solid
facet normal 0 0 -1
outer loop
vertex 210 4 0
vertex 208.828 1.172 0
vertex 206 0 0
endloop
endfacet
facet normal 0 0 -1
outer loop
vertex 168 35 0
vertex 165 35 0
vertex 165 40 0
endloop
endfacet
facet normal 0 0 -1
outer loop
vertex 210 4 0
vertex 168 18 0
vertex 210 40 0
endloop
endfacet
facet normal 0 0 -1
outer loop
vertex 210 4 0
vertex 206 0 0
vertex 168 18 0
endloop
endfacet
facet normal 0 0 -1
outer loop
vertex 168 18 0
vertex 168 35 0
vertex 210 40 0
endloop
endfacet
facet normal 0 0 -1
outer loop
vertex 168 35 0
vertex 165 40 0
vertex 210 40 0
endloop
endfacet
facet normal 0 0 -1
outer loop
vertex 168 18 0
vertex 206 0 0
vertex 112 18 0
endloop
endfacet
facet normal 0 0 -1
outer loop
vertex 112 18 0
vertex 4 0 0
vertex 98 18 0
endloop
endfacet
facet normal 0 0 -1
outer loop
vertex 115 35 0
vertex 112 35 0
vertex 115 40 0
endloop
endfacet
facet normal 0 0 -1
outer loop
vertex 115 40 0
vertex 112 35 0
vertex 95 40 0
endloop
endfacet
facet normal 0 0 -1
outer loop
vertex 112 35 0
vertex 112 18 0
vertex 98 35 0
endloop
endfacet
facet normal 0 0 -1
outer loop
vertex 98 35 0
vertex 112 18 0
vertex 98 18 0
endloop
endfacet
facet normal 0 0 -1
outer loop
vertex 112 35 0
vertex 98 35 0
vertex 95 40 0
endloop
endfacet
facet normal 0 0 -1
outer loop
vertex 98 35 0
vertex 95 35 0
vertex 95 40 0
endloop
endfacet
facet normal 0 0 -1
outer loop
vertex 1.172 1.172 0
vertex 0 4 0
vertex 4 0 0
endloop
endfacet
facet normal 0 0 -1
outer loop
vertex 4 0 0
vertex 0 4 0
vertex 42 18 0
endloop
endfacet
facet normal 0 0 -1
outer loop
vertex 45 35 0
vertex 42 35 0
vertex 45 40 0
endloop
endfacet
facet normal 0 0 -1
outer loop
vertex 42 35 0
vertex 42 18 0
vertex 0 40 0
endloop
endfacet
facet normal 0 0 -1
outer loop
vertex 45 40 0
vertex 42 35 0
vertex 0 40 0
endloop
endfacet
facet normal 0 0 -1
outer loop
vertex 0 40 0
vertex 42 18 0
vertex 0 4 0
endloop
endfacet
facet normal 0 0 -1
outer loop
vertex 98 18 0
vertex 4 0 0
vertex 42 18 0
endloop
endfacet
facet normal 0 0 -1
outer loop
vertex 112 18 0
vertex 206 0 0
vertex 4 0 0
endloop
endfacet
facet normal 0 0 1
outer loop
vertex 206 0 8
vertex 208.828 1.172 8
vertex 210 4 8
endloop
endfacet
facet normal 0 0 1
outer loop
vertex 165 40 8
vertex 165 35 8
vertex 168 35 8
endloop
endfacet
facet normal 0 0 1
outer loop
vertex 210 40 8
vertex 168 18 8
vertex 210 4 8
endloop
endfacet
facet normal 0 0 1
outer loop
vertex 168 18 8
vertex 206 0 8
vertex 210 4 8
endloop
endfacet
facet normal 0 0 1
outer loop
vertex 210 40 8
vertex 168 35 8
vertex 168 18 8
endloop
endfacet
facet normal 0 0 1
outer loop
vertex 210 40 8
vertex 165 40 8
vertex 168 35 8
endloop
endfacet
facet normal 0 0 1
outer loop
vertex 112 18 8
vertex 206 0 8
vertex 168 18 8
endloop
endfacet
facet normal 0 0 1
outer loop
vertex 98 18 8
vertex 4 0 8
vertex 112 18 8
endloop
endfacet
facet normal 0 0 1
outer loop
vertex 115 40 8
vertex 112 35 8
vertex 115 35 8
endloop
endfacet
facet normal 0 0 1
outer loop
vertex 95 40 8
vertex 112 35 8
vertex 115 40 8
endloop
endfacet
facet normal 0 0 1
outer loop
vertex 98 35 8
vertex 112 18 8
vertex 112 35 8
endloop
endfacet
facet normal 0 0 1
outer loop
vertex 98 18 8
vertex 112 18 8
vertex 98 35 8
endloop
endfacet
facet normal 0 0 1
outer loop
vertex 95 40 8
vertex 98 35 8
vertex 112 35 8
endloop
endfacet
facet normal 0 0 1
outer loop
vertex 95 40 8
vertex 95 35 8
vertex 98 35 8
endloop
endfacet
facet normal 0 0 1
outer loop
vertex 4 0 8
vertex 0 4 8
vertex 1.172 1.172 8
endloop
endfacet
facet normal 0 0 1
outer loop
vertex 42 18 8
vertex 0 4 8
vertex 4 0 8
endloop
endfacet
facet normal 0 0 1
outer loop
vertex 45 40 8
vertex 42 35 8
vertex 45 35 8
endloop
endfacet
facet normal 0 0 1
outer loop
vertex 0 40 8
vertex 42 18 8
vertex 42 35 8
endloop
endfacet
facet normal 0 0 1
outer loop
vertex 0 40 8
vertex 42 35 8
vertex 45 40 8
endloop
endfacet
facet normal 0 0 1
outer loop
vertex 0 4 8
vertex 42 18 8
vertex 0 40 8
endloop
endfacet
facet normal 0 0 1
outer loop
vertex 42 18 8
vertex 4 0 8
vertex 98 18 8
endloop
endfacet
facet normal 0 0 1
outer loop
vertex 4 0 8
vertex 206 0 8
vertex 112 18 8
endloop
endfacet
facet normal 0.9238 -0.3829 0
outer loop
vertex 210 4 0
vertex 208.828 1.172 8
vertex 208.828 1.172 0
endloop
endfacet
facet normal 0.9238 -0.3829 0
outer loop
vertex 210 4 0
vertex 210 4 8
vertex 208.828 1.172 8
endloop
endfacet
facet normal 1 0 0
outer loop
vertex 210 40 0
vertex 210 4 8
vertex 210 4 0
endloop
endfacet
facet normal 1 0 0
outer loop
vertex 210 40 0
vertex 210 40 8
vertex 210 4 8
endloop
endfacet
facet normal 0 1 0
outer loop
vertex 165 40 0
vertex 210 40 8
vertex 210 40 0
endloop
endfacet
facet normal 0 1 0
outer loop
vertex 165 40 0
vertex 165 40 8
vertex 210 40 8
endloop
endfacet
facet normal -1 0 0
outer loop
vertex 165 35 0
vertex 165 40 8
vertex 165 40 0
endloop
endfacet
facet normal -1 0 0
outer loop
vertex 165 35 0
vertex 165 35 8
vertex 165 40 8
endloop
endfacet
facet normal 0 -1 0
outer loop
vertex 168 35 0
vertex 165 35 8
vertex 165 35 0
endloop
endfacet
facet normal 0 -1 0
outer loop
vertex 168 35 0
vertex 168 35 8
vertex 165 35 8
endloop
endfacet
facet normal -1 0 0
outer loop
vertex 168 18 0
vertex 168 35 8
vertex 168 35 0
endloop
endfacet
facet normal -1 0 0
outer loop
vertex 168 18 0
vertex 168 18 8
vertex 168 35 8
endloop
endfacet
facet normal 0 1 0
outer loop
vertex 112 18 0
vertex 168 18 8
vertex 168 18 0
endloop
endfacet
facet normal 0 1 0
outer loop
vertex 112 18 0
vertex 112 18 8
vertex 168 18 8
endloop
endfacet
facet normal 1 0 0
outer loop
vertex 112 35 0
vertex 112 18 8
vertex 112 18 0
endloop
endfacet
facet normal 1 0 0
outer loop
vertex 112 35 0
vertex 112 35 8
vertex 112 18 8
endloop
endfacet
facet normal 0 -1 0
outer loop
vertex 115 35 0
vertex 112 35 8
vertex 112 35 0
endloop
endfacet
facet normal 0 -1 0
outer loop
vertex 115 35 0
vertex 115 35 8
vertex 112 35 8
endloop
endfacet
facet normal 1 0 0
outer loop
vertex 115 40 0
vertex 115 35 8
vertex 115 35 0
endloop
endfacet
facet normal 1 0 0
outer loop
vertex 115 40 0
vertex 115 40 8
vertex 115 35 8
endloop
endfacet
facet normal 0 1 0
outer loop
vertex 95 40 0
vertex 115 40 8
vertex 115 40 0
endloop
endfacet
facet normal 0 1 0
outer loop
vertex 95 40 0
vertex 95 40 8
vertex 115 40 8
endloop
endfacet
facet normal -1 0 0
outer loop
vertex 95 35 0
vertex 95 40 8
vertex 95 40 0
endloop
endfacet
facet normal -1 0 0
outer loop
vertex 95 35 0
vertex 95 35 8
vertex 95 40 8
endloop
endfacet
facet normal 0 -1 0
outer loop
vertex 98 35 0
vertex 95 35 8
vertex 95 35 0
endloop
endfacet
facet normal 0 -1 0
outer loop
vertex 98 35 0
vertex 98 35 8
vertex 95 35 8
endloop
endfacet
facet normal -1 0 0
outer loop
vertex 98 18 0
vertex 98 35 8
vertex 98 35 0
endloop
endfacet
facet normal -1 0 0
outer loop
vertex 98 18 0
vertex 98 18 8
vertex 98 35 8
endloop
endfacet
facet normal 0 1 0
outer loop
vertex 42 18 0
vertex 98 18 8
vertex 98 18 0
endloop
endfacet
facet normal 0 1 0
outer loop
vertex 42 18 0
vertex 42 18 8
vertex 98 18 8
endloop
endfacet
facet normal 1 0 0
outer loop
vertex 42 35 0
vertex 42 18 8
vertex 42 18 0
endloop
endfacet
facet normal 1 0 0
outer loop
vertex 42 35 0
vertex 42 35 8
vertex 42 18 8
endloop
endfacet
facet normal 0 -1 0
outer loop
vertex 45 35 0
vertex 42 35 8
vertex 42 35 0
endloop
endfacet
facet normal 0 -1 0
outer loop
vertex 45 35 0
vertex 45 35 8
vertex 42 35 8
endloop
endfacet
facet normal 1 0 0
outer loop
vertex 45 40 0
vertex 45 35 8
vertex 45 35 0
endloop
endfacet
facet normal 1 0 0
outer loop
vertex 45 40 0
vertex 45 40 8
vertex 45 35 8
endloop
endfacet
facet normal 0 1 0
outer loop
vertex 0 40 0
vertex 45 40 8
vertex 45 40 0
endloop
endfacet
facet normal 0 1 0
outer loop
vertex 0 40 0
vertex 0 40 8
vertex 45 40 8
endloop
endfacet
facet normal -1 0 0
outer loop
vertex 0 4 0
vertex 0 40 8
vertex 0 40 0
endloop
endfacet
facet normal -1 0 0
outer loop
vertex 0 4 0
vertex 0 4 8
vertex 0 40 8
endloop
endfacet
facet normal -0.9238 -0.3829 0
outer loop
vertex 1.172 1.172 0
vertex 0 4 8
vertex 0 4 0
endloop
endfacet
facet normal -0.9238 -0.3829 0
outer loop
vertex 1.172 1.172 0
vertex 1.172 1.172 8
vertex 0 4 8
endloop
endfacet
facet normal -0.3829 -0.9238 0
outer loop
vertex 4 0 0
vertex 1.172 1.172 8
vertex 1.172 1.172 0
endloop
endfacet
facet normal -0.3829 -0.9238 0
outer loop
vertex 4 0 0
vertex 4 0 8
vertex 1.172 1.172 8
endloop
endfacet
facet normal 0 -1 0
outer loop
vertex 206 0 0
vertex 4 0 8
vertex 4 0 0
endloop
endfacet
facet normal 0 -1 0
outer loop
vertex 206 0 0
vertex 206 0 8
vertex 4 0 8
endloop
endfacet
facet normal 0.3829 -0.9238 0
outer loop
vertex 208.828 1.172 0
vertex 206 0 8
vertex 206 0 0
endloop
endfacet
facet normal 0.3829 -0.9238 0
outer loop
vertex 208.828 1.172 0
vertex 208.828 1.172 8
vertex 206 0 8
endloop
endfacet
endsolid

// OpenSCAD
$fn = 32;

// ----------------------------------------------------------------------
// Oversize slot bar: 210 mm bar with 2 oversize windows
// ----------------------------------------------------------------------

// --- parameters (mm) ---
profile_height = 8;       // extrusion height
profile_points = 24;      // points of the closed outline

profile = [[0, 4], [1.172, 1.172], [4, 0], [206, 0], [208.828, 1.172], [210, 4], [210, 40], [165, 40], [165, 35], [168, 35], [168, 18], [112, 18], [112, 35], [115, 35], [115, 40], [95, 40], [95, 35], [98, 35], [98, 18], [42, 18], [42, 35], [45, 35], [45, 40], [0, 40]];  // single closed polygon, 24 points, counter clockwise

// --- the one profile operation ---
linear_extrude(height = profile_height) polygon(points = profile);
